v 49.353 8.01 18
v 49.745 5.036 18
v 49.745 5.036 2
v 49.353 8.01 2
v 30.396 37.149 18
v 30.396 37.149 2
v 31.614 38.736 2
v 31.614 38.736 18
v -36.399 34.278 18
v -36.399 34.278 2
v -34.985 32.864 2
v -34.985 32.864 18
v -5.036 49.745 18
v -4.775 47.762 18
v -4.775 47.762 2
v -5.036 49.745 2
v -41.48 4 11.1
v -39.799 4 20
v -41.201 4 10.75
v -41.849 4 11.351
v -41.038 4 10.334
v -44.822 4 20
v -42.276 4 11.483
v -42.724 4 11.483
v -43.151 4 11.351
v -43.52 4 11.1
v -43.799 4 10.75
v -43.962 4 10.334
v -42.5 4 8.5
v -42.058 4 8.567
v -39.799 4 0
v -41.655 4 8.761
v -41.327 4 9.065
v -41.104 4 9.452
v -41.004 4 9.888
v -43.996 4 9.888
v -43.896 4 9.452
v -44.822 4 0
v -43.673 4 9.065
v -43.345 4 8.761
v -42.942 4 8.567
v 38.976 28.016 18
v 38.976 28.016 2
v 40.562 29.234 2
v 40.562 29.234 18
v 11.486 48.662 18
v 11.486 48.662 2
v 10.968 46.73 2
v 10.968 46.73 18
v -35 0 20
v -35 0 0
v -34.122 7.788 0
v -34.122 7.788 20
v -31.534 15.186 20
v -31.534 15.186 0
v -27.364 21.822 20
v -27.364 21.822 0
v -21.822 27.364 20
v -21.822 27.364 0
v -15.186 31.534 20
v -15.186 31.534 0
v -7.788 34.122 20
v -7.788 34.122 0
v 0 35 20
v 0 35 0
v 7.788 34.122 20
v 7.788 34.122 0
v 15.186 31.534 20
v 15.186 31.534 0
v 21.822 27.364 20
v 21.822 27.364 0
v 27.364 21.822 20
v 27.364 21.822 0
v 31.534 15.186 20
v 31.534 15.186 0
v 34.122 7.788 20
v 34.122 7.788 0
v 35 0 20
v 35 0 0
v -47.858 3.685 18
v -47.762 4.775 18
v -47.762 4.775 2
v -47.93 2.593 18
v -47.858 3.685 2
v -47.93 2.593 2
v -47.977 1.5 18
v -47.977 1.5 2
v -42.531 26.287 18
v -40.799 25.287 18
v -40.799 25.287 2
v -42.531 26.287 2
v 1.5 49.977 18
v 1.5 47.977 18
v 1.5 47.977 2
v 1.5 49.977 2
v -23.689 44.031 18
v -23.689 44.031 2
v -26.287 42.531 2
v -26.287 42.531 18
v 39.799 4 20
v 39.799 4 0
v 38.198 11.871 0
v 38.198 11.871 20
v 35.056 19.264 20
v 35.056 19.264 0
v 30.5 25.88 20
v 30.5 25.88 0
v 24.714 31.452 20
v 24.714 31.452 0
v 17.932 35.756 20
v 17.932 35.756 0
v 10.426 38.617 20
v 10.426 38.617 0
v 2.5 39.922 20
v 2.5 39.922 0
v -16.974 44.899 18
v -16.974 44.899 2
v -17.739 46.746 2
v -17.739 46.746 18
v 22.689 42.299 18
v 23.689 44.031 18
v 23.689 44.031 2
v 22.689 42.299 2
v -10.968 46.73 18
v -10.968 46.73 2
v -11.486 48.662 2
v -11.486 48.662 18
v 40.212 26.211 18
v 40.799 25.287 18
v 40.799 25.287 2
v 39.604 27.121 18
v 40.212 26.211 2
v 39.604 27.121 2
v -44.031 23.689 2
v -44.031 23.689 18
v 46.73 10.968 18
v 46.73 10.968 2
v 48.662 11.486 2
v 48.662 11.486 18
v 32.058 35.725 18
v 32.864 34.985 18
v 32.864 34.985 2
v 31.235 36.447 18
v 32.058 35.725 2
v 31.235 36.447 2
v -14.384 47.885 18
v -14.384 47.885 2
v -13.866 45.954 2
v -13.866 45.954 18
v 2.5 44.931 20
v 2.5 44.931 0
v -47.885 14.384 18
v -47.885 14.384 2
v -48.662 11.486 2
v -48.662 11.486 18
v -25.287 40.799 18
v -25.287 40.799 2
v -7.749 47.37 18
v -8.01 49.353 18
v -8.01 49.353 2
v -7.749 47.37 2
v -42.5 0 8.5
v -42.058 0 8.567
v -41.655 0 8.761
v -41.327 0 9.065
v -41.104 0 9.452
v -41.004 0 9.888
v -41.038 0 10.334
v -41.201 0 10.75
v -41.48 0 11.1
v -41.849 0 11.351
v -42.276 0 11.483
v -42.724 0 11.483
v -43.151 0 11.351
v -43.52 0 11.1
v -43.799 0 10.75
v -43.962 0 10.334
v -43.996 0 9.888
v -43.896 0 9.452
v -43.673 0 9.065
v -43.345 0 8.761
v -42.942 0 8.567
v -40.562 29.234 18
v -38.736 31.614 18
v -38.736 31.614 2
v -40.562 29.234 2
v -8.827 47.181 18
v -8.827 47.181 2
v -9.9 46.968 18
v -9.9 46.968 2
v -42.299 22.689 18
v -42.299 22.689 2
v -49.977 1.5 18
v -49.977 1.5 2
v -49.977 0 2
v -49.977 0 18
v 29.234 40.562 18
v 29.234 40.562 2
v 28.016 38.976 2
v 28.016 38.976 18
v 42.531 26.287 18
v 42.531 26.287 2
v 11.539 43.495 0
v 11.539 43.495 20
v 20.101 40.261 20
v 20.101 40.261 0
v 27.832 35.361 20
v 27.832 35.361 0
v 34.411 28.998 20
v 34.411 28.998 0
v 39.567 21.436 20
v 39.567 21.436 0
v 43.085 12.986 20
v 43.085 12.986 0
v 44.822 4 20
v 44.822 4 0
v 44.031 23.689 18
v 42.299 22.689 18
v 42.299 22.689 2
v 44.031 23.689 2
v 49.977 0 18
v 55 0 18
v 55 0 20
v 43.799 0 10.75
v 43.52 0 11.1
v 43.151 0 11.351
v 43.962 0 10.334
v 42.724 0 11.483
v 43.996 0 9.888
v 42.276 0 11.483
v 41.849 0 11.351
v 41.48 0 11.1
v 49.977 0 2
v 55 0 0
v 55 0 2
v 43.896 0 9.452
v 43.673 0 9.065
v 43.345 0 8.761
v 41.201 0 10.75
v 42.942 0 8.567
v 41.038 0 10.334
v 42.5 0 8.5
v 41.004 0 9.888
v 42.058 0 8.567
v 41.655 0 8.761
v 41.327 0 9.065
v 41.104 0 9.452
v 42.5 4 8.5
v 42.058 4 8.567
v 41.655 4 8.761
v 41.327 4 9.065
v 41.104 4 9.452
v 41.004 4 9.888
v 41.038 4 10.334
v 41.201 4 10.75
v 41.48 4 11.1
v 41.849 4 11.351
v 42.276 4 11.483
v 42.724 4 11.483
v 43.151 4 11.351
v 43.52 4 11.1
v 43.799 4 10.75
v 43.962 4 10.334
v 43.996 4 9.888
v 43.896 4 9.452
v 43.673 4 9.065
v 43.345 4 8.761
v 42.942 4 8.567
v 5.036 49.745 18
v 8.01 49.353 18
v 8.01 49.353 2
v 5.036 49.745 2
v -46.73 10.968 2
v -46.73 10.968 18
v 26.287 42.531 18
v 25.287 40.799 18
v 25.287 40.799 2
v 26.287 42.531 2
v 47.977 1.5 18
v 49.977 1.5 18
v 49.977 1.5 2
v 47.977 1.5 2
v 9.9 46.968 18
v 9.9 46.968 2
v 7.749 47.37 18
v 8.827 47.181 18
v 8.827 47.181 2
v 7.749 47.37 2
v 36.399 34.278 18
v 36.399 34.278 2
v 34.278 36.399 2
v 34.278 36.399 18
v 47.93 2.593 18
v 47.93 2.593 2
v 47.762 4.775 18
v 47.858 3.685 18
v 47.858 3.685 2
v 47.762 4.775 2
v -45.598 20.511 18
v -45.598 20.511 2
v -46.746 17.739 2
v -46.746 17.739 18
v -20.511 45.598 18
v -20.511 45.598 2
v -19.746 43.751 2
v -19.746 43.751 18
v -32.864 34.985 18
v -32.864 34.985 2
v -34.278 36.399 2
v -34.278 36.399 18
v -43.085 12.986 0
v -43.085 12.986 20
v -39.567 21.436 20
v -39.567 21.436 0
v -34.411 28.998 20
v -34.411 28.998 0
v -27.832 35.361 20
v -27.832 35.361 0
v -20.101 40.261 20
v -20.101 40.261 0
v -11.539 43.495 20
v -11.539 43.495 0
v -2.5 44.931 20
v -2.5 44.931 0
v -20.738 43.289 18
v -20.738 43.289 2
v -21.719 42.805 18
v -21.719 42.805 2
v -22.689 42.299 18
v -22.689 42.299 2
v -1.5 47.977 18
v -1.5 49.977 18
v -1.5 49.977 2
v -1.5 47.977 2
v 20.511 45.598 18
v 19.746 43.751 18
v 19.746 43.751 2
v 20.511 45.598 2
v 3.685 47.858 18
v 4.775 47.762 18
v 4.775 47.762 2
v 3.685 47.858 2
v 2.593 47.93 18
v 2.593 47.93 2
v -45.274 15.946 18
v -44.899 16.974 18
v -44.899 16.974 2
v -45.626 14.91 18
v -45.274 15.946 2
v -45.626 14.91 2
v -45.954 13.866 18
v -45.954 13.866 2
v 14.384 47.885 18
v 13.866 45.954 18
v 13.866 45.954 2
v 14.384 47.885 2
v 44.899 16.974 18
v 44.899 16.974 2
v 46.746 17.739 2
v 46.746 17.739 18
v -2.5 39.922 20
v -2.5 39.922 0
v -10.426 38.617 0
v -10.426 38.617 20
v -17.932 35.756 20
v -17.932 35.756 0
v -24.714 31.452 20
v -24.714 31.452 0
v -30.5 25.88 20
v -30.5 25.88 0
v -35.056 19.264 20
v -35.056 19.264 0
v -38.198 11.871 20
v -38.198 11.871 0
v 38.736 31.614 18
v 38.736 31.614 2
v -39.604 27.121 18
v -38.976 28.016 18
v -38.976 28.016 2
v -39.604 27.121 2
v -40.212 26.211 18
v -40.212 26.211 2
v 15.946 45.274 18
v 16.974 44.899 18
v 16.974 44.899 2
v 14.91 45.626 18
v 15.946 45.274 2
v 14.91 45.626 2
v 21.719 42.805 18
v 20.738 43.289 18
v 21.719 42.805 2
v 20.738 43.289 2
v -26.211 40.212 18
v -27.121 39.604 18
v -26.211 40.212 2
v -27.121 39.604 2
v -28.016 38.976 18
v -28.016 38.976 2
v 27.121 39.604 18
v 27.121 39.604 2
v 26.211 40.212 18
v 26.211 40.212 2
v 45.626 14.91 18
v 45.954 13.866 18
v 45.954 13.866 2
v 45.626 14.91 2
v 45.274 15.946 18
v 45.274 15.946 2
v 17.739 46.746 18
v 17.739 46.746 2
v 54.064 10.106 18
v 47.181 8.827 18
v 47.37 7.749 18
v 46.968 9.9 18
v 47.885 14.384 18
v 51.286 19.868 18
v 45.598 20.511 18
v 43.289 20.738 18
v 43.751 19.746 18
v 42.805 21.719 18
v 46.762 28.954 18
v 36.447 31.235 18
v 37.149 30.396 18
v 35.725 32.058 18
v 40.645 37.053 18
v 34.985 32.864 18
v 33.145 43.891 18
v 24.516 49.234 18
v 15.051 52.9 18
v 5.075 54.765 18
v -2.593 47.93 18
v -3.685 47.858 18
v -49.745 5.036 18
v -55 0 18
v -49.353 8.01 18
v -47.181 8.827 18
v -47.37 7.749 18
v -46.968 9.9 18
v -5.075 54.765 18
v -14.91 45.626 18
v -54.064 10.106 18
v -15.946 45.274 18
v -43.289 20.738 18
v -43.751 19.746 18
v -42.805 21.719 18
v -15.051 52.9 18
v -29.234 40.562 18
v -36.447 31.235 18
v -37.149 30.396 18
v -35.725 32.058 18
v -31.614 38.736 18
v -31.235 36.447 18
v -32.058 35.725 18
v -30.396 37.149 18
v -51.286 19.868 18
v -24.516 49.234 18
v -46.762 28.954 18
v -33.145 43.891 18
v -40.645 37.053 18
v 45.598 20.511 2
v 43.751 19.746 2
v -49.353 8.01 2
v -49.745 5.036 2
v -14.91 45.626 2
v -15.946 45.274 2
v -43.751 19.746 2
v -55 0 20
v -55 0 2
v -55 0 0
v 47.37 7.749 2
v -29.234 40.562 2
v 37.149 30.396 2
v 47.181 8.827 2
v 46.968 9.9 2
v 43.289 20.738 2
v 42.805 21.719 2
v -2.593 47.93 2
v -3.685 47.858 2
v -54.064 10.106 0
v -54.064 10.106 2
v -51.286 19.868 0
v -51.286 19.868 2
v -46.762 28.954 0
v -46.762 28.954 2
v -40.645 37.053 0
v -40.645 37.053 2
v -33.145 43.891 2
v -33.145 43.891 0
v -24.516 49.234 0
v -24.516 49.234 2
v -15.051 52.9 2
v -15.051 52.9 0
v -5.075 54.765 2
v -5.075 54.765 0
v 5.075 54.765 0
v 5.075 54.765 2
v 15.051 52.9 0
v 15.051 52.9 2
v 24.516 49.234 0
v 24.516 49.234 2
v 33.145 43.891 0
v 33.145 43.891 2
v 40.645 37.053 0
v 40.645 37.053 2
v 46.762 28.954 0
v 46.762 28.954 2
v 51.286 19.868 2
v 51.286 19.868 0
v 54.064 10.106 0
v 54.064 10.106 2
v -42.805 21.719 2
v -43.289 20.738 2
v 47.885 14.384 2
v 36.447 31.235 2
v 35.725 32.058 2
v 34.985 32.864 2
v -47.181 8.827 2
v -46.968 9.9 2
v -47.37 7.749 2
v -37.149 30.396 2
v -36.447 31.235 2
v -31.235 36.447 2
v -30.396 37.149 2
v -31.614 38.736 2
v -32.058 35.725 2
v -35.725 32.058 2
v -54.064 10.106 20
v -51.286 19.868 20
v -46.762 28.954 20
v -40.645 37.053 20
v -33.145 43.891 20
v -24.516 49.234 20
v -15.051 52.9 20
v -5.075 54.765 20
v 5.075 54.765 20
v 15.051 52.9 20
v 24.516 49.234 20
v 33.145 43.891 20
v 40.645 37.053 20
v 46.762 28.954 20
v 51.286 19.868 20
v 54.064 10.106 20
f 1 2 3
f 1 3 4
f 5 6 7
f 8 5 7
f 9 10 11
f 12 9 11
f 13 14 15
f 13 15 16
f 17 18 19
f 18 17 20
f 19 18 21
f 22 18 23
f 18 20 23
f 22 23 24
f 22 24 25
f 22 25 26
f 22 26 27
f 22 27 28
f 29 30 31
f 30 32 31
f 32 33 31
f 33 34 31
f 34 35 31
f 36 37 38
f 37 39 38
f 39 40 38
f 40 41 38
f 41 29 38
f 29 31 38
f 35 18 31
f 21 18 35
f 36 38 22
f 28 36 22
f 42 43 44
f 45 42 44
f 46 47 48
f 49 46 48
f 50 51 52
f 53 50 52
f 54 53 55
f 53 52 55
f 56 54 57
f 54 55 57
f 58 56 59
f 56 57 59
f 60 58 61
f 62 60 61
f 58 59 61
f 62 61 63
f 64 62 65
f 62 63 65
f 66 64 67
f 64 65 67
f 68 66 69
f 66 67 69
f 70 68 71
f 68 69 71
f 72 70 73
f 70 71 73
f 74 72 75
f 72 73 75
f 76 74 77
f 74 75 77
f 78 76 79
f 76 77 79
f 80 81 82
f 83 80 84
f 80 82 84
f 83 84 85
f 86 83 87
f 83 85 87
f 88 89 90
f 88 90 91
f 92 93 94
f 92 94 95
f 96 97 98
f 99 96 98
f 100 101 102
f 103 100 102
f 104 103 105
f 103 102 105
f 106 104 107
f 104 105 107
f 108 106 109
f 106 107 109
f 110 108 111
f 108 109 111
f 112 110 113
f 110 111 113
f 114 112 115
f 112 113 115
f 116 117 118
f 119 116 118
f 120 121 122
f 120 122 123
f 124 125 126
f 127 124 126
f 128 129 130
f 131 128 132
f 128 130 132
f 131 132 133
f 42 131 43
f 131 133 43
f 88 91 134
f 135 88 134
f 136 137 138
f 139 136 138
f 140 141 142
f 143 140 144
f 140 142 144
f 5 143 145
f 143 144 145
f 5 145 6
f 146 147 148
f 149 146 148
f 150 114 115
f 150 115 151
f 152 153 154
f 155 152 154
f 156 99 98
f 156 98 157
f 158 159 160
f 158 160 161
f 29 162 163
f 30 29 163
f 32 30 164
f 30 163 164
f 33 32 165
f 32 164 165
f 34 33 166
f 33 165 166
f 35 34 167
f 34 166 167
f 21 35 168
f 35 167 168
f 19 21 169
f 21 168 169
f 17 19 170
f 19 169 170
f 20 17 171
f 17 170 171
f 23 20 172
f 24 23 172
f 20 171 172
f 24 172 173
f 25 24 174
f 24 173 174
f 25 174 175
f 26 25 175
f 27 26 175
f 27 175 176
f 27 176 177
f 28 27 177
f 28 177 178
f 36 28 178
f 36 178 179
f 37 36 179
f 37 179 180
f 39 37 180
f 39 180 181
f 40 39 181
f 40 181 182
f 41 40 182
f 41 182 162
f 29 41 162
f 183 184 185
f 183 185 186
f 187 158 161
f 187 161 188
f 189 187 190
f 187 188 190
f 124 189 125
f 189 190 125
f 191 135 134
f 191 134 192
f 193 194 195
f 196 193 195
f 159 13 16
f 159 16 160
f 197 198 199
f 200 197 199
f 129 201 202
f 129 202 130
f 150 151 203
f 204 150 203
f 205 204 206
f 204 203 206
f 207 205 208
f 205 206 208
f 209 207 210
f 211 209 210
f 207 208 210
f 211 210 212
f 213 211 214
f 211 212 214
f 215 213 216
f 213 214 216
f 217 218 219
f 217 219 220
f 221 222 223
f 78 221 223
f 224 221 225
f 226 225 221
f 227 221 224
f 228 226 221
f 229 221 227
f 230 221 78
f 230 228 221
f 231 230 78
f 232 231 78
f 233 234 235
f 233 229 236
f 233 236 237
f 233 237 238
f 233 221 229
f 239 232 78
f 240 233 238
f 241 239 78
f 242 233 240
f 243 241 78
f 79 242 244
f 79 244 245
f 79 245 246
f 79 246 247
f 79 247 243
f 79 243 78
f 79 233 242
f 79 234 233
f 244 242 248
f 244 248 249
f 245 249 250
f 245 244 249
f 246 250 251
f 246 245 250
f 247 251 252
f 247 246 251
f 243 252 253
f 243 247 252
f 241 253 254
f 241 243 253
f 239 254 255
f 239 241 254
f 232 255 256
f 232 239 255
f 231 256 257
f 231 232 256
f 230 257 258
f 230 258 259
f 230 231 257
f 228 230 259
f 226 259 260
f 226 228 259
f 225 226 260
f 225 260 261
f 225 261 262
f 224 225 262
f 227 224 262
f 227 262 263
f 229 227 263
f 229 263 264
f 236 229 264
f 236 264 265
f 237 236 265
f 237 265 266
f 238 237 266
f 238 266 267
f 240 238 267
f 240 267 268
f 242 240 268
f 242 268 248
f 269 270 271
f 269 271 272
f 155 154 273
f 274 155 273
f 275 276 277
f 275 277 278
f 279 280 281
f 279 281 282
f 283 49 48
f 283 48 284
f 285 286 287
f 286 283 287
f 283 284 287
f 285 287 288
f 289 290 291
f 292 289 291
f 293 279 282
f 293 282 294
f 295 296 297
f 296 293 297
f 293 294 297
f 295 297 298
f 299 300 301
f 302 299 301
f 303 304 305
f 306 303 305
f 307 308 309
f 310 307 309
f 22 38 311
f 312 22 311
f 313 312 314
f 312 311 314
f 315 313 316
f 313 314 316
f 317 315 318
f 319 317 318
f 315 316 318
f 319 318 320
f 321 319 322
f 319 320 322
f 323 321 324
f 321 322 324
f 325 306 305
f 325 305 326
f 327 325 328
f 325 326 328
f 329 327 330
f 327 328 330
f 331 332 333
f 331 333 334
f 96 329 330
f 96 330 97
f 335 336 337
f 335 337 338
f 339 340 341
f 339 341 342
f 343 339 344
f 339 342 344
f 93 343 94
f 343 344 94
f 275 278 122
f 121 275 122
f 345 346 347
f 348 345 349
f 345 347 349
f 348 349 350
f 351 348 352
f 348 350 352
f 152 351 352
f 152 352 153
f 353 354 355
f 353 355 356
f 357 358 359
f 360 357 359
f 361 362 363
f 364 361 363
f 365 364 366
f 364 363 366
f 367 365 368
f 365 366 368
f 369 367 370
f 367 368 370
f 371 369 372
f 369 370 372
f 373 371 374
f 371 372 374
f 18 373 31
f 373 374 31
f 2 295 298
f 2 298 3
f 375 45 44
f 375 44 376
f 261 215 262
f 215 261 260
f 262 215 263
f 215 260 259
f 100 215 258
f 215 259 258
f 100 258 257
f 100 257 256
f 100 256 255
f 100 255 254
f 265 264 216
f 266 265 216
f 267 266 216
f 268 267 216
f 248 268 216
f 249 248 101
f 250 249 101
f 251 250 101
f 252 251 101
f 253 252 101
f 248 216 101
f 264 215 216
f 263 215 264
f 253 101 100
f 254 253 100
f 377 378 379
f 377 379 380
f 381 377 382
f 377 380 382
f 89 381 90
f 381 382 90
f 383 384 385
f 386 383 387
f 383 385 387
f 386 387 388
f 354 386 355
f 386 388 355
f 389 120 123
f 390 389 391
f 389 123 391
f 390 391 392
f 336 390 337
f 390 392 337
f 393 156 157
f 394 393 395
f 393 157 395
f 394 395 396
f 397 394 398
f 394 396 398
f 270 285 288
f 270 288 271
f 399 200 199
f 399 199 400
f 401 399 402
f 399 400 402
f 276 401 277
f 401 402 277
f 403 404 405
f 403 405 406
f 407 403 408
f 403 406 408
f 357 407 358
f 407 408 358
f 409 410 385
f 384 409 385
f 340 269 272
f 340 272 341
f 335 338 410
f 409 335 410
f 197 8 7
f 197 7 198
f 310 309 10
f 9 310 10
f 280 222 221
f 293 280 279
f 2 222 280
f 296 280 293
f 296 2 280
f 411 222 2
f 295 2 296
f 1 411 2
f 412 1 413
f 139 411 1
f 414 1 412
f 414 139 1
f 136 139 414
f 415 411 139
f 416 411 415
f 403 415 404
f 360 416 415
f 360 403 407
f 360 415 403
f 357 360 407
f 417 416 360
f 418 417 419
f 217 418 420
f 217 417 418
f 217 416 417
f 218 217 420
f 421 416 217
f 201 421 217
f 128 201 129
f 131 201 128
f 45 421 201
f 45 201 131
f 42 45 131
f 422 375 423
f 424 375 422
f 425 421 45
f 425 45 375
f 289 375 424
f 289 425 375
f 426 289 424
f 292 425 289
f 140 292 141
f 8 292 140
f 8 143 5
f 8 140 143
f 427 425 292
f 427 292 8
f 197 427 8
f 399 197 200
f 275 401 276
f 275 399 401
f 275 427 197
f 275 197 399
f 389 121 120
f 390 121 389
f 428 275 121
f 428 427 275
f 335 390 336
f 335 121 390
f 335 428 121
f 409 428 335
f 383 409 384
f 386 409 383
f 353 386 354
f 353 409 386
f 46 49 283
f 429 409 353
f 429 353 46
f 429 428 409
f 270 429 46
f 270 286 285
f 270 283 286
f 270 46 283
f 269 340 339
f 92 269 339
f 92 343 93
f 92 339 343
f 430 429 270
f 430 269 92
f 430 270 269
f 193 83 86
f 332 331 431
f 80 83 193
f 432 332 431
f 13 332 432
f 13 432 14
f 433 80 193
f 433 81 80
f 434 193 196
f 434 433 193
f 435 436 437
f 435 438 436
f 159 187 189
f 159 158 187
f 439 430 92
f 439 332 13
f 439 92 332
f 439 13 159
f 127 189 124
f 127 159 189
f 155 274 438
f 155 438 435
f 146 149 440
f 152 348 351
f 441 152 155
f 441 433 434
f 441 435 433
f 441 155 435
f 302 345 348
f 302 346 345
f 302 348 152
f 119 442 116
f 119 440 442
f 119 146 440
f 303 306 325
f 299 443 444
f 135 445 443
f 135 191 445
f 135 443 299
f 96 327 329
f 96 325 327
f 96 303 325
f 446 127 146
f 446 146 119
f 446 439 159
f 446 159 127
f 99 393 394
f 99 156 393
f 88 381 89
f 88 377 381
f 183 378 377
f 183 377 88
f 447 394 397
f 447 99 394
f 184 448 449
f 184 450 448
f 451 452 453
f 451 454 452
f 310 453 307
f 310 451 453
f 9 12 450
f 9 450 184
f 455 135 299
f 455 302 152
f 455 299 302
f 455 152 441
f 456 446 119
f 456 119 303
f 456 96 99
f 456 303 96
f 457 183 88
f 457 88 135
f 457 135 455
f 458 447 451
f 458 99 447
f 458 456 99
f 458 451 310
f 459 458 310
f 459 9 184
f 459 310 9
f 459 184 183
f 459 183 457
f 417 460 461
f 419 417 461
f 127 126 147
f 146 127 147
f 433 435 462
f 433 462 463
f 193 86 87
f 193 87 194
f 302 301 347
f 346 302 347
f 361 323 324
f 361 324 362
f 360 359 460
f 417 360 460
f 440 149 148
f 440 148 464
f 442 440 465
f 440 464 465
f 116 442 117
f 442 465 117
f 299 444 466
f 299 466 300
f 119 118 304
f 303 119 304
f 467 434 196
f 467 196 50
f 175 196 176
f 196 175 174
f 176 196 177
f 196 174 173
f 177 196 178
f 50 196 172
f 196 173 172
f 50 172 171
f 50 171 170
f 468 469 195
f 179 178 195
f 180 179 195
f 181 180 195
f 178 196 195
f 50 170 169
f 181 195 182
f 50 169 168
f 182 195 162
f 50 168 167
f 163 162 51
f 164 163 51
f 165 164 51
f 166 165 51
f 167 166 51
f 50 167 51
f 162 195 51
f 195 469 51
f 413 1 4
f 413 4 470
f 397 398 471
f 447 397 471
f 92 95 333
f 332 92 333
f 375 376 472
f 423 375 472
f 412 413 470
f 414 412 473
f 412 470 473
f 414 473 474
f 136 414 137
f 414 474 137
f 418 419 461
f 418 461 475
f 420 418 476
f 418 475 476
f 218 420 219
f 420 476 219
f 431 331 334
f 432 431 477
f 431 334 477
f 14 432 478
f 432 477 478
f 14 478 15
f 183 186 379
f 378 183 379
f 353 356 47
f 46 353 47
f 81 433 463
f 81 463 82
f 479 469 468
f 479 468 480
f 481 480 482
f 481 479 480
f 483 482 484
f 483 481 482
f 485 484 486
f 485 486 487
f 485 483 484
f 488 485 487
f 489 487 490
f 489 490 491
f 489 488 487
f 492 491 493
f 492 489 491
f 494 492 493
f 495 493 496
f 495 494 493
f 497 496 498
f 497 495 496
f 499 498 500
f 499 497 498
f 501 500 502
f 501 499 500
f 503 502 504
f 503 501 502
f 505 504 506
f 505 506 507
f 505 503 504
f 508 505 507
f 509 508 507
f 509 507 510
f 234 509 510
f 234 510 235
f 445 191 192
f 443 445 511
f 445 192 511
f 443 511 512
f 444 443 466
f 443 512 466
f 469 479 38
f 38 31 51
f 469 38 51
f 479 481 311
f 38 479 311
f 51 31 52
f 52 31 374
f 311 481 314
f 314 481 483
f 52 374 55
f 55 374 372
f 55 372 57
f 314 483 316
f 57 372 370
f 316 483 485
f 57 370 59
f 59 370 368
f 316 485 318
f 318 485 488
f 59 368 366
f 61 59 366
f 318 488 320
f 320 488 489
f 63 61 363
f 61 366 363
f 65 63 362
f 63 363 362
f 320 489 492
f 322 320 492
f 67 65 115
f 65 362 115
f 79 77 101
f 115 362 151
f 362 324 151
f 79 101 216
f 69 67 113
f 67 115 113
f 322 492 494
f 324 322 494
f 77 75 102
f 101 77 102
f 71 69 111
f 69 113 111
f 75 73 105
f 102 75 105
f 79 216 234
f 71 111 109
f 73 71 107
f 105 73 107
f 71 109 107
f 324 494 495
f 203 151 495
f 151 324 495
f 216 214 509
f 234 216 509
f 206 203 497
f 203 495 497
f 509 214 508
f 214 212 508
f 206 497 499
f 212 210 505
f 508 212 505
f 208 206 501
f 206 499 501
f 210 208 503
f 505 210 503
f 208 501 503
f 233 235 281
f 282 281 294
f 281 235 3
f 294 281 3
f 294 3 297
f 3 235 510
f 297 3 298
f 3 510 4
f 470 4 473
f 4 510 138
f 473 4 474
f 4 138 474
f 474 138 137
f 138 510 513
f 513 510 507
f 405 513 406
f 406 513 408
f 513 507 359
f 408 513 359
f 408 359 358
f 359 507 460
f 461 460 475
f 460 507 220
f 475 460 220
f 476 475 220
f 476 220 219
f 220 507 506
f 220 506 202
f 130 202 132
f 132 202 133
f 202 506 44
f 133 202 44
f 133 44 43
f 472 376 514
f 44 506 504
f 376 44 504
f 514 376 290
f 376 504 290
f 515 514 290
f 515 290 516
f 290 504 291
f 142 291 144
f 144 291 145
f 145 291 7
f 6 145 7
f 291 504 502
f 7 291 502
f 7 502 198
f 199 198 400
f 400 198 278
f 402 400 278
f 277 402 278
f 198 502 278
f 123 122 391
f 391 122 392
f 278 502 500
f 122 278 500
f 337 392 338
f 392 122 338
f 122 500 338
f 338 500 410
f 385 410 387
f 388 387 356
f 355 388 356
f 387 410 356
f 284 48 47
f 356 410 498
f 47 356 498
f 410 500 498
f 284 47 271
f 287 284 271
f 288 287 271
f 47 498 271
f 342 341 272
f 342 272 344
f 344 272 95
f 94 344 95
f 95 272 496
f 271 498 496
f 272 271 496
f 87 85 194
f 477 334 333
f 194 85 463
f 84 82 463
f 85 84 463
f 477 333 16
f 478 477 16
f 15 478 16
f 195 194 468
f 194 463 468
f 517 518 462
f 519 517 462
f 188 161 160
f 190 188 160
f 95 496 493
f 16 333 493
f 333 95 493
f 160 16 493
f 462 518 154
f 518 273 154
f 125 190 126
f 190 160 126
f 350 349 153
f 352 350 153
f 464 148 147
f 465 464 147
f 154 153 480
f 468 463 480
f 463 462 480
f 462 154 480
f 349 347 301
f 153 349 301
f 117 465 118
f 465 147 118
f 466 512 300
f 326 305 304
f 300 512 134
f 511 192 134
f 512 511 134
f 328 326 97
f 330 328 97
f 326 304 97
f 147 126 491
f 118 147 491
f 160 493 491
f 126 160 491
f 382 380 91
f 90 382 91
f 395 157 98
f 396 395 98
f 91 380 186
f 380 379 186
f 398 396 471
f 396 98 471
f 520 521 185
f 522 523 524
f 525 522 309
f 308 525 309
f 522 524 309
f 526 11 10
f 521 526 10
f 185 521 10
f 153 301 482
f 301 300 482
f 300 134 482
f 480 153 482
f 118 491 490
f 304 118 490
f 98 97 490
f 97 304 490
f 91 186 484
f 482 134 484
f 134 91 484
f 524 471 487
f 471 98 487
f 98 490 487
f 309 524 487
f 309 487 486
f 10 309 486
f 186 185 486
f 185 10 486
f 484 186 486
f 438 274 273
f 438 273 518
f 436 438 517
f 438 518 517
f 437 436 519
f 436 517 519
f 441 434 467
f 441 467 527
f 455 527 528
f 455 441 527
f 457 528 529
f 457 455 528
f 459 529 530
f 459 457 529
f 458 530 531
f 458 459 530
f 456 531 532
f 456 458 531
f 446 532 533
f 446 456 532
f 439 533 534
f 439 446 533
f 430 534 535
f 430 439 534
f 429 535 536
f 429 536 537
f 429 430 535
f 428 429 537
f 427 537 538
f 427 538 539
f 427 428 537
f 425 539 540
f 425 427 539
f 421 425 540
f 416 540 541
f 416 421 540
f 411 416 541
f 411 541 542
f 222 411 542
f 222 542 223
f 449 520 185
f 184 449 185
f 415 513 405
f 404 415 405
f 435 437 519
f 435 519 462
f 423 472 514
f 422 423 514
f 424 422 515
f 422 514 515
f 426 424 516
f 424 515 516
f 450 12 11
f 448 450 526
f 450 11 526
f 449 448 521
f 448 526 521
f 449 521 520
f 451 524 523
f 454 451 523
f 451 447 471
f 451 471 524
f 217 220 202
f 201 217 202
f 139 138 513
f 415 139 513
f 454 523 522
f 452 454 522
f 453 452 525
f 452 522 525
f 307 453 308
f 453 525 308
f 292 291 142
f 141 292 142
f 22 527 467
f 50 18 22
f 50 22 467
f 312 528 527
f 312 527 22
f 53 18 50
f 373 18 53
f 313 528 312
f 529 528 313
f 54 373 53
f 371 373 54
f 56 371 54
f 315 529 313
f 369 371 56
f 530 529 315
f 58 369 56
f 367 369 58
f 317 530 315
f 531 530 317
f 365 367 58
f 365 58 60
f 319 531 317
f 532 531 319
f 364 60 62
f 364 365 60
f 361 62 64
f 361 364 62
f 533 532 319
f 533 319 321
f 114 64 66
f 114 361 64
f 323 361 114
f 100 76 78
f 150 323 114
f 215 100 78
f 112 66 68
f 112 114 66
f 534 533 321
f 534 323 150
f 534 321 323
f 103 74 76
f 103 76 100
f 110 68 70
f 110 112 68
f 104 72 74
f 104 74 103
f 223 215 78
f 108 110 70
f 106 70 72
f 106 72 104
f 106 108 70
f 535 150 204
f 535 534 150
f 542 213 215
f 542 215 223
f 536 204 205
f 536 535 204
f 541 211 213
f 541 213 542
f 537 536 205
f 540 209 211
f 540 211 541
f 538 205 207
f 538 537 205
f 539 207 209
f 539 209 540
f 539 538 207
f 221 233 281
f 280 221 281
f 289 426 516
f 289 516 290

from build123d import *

# Parameters (mm, degrees)
BOSS_EXTRUDE1_DEPTH = 20
CUT_EXTRUDE2_REACH  = 75.453
SKETCH3_R           = 1.5
BOSS_EXTRUDE3_DEPTH = 2
BOSS_EXTRUDE4_START = -2
BOSS_EXTRUDE4_DEPTH = 2


with BuildPart() as part:
    # Sketch1 → Boss-Extrude1 (new body)
    with BuildSketch(Plane.XY):
        with BuildLine():
            Line((35, 0), (49.976556775, 0))
            Line((49.976556775, 0), (49.976556775, 1.5))
            Line((49.976556775, 1.5), (47.976556775, 1.5))
            ThreePointArc((47.976556775, 1.5), (47.897228315, 3.139350203), (47.761899969, 4.77502998))
            Line((47.761899969, 4.77502998), (49.744789692, 5.036082364))
            Line((49.744789692, 5.036082364), (49.353211116, 8.010416948))
            Line((49.353211116, 8.010416948), (47.370321393, 7.749364564))
            ThreePointArc((47.370321393, 7.749364564), (47.077693459, 9.364335457), (46.730023813, 10.968357872))
            Line((46.730023813, 10.968357872), (48.661875466, 11.485995963))
            Line((48.661875466, 11.485995963), (47.88541833, 14.383773441))
            Line((47.88541833, 14.383773441), (45.953566678, 13.866135351))
            ThreePointArc((45.953566678, 13.866135351), (45.452646216, 15.429094335), (44.898583993, 16.974014121))
            Line((44.898583993, 16.974014121), (46.746343059, 17.739380986))
            Line((46.746343059, 17.739380986), (45.598292761, 20.511019583))
            Line((45.598292761, 20.511019583), (43.750533696, 19.745652719))
            ThreePointArc((43.750533696, 19.745652719), (43.049891594, 21.229857131), (42.298916953, 22.689240282))
            Line((42.298916953, 22.689240282), (44.030967761, 23.689240282))
            Line((44.030967761, 23.689240282), (42.530967761, 26.287316493))
            Line((42.530967761, 26.287316493), (40.798916953, 25.287316493))
            ThreePointArc((40.798916953, 25.287316493), (39.910541391, 26.667371185), (38.975503717, 28.016247251))
            Line((38.975503717, 28.016247251), (40.562210397, 29.233770109))
            Line((40.562210397, 29.233770109), (38.73592611, 31.61383013))
            Line((38.73592611, 31.61383013), (37.14921943, 30.396307272))
            ThreePointArc((37.14921943, 30.396307272), (36.088310759, 31.648599125), (34.985208805, 32.863888462))
            Line((34.985208805, 32.863888462), (36.399422368, 34.278102024))
            Line((36.399422368, 34.278102024), (34.278102024, 36.399422368))
            Line((34.278102024, 36.399422368), (32.863888462, 34.985208805))
            ThreePointArc((32.863888462, 34.985208805), (31.648599125, 36.088310759), (30.396307272, 37.14921943))
            Line((30.396307272, 37.14921943), (31.61383013, 38.73592611))
            Line((31.61383013, 38.73592611), (29.233770109, 40.562210397))
            Line((29.233770109, 40.562210397), (28.016247251, 38.975503717))
            ThreePointArc((28.016247251, 38.975503717), (26.667371185, 39.910541391), (25.287316493, 40.798916953))
            Line((25.287316493, 40.798916953), (26.287316493, 42.530967761))
            Line((26.287316493, 42.530967761), (23.689240282, 44.030967761))
            Line((23.689240282, 44.030967761), (22.689240282, 42.298916953))
            ThreePointArc((22.689240282, 42.298916953), (21.229857131, 43.049891594), (19.745652719, 43.750533696))
            Line((19.745652719, 43.750533696), (20.511019583, 45.598292761))
            Line((20.511019583, 45.598292761), (17.739380986, 46.746343059))
            Line((17.739380986, 46.746343059), (16.974014121, 44.898583993))
            ThreePointArc((16.974014121, 44.898583993), (15.429094335, 45.452646216), (13.866135351, 45.953566678))
            Line((13.866135351, 45.953566678), (14.383773441, 47.88541833))
            Line((14.383773441, 47.88541833), (11.485995963, 48.661875466))
            Line((11.485995963, 48.661875466), (10.968357872, 46.730023813))
            ThreePointArc((10.968357872, 46.730023813), (9.364335457, 47.077693459), (7.749364564, 47.370321393))
            Line((7.749364564, 47.370321393), (8.010416948, 49.353211116))
            Line((8.010416948, 49.353211116), (5.036082364, 49.744789692))
            Line((5.036082364, 49.744789692), (4.77502998, 47.761899969))
            ThreePointArc((4.77502998, 47.761899969), (3.139350203, 47.897228315), (1.5, 47.976556775))
            Line((1.5, 47.976556775), (1.5, 49.976556775))
            Line((1.5, 49.976556775), (-1.5, 49.976556775))
            Line((-1.5, 49.976556775), (-1.5, 47.976556775))
            ThreePointArc((-1.5, 47.976556775), (-3.139350203, 47.897228315), (-4.77502998, 47.761899969))
            Line((-4.77502998, 47.761899969), (-5.036082364, 49.744789692))
            Line((-5.036082364, 49.744789692), (-8.010416948, 49.353211116))
            Line((-8.010416948, 49.353211116), (-7.749364564, 47.370321393))
            ThreePointArc((-7.749364564, 47.370321393), (-9.364335457, 47.077693459), (-10.968357872, 46.730023813))
            Line((-10.968357872, 46.730023813), (-11.485995963, 48.661875466))
            Line((-11.485995963, 48.661875466), (-14.383773441, 47.88541833))
            Line((-14.383773441, 47.88541833), (-13.866135351, 45.953566678))
            ThreePointArc((-13.866135351, 45.953566678), (-15.429094335, 45.452646216), (-16.974014121, 44.898583993))
            Line((-16.974014121, 44.898583993), (-17.739380986, 46.746343059))
            Line((-17.739380986, 46.746343059), (-20.511019583, 45.598292761))
            Line((-20.511019583, 45.598292761), (-19.745652719, 43.750533696))
            ThreePointArc((-19.745652719, 43.750533696), (-21.229857131, 43.049891594), (-22.689240282, 42.298916953))
            Line((-22.689240282, 42.298916953), (-23.689240282, 44.030967761))
            Line((-23.689240282, 44.030967761), (-26.287316493, 42.530967761))
            Line((-26.287316493, 42.530967761), (-25.287316493, 40.798916953))
            ThreePointArc((-25.287316493, 40.798916953), (-26.667371185, 39.910541391), (-28.016247251, 38.975503717))
            Line((-28.016247251, 38.975503717), (-29.233770109, 40.562210397))
            Line((-29.233770109, 40.562210397), (-31.61383013, 38.73592611))
            Line((-31.61383013, 38.73592611), (-30.396307272, 37.14921943))
            ThreePointArc((-30.396307272, 37.14921943), (-31.648599125, 36.088310759), (-32.863888462, 34.985208805))
            Line((-32.863888462, 34.985208805), (-34.278102024, 36.399422368))
            Line((-34.278102024, 36.399422368), (-36.399422368, 34.278102024))
            Line((-36.399422368, 34.278102024), (-34.985208805, 32.863888462))
            ThreePointArc((-34.985208805, 32.863888462), (-36.088310759, 31.648599125), (-37.14921943, 30.396307272))
            Line((-37.14921943, 30.396307272), (-38.73592611, 31.61383013))
            Line((-38.73592611, 31.61383013), (-40.562210397, 29.233770109))
            Line((-40.562210397, 29.233770109), (-38.975503717, 28.016247251))
            ThreePointArc((-38.975503717, 28.016247251), (-39.910541391, 26.667371185), (-40.798916953, 25.287316493))
            Line((-40.798916953, 25.287316493), (-42.530967761, 26.287316493))
            Line((-42.530967761, 26.287316493), (-44.030967761, 23.689240282))
            Line((-44.030967761, 23.689240282), (-42.298916953, 22.689240282))
            ThreePointArc((-42.298916953, 22.689240282), (-43.049891594, 21.229857131), (-43.750533696, 19.745652719))
            Line((-43.750533696, 19.745652719), (-45.598292761, 20.511019583))
            Line((-45.598292761, 20.511019583), (-46.746343059, 17.739380986))
            Line((-46.746343059, 17.739380986), (-44.898583993, 16.974014121))
            ThreePointArc((-44.898583993, 16.974014121), (-45.452646216, 15.429094335), (-45.953566678, 13.866135351))
            Line((-45.953566678, 13.866135351), (-47.88541833, 14.383773441))
            Line((-47.88541833, 14.383773441), (-48.661875466, 11.485995963))
            Line((-48.661875466, 11.485995963), (-46.730023813, 10.968357872))
            ThreePointArc((-46.730023813, 10.968357872), (-47.077693459, 9.364335457), (-47.370321393, 7.749364564))
            Line((-47.370321393, 7.749364564), (-49.353211116, 8.010416948))
            Line((-49.353211116, 8.010416948), (-49.744789692, 5.036082364))
            Line((-49.744789692, 5.036082364), (-47.761899969, 4.77502998))
            ThreePointArc((-47.761899969, 4.77502998), (-47.897228315, 3.139350203), (-47.976556775, 1.5))
            Line((-47.976556775, 1.5), (-49.976556775, 1.5))
            Line((-49.976556775, 1.5), (-49.976556775, 0))
            Line((-49.976556775, 0), (-35, 0))
            ThreePointArc((-35, 0), (0, 35), (35, 0))
        make_face()
        with BuildLine():
            Line((44.821869662, 4), (39.799497484, 4))
            ThreePointArc((39.799497484, 4), (27.747175978, 28.811355839), (2.5, 39.921798557))
            Line((2.5, 39.921798557), (2.5, 44.930501889))
            ThreePointArc((2.5, 44.930501889), (31.283643223, 32.34708127), (44.821869662, 4))
        make_face(mode=Mode.SUBTRACT)
        with BuildLine():
            ThreePointArc((-44.821869662, 4), (-31.283643223, 32.34708127), (-2.5, 44.930501889))
            Line((-2.5, 44.930501889), (-2.5, 39.921798557))
            ThreePointArc((-2.5, 39.921798557), (-27.747175978, 28.811355839), (-39.799497484, 4))
            Line((-39.799497484, 4), (-44.821869662, 4))
        make_face(mode=Mode.SUBTRACT)
    extrude(amount=BOSS_EXTRUDE1_DEPTH)

    # Sketch3 → Cut-Extrude2 (cut, up to next)
    with BuildSketch(Plane.XZ, mode=Mode.PRIVATE) as cut_extrude2_sk1:
        with Locations(Location((-42.5, 10, 0), (0, 0, 270))):
            Circle(SKETCH3_R)
    cut_extrude2_tool1 = extrude(cut_extrude2_sk1.sketch, amount=-CUT_EXTRUDE2_REACH, mode=Mode.PRIVATE) & part.part
    cut_extrude2 = cut_extrude2_tool1.solids().sort_by_distance((-42.5, 0, 10))[0]
    add(cut_extrude2, mode=Mode.SUBTRACT)

    # Mirror2: Cut-Extrude2 across plane
    add(cut_extrude2.mirror(Plane(origin=(0, 0, 0), x_dir=(0, 0, 1), z_dir=(1, 0, 0))), mode=Mode.SUBTRACT)

    # Sketch5 → Boss-Extrude3 (add)
    with BuildSketch(Plane.XY):
        with BuildLine():
            Line((-48, 0), (-55, 0))
            ThreePointArc((-55, 0), (0, 55), (55, 0))
            Line((55, 0), (48, 0))
            ThreePointArc((48, 0), (0, 48), (-48, 0))
        make_face()
    extrude(amount=BOSS_EXTRUDE3_DEPTH)

    # Sketch6 → Boss-Extrude4 (add)
    with BuildSketch(Plane.XY.offset(20).offset(BOSS_EXTRUDE4_START)):
        with BuildLine():
            Line((-45, 0), (-55, 0))
            ThreePointArc((-55, 0), (0, 55), (55, 0))
            Line((55, 0), (45, 0))
            ThreePointArc((45, 0), (0, 45), (-45, 0))
        make_face()
    extrude(amount=BOSS_EXTRUDE4_DEPTH)


solid = part.part
